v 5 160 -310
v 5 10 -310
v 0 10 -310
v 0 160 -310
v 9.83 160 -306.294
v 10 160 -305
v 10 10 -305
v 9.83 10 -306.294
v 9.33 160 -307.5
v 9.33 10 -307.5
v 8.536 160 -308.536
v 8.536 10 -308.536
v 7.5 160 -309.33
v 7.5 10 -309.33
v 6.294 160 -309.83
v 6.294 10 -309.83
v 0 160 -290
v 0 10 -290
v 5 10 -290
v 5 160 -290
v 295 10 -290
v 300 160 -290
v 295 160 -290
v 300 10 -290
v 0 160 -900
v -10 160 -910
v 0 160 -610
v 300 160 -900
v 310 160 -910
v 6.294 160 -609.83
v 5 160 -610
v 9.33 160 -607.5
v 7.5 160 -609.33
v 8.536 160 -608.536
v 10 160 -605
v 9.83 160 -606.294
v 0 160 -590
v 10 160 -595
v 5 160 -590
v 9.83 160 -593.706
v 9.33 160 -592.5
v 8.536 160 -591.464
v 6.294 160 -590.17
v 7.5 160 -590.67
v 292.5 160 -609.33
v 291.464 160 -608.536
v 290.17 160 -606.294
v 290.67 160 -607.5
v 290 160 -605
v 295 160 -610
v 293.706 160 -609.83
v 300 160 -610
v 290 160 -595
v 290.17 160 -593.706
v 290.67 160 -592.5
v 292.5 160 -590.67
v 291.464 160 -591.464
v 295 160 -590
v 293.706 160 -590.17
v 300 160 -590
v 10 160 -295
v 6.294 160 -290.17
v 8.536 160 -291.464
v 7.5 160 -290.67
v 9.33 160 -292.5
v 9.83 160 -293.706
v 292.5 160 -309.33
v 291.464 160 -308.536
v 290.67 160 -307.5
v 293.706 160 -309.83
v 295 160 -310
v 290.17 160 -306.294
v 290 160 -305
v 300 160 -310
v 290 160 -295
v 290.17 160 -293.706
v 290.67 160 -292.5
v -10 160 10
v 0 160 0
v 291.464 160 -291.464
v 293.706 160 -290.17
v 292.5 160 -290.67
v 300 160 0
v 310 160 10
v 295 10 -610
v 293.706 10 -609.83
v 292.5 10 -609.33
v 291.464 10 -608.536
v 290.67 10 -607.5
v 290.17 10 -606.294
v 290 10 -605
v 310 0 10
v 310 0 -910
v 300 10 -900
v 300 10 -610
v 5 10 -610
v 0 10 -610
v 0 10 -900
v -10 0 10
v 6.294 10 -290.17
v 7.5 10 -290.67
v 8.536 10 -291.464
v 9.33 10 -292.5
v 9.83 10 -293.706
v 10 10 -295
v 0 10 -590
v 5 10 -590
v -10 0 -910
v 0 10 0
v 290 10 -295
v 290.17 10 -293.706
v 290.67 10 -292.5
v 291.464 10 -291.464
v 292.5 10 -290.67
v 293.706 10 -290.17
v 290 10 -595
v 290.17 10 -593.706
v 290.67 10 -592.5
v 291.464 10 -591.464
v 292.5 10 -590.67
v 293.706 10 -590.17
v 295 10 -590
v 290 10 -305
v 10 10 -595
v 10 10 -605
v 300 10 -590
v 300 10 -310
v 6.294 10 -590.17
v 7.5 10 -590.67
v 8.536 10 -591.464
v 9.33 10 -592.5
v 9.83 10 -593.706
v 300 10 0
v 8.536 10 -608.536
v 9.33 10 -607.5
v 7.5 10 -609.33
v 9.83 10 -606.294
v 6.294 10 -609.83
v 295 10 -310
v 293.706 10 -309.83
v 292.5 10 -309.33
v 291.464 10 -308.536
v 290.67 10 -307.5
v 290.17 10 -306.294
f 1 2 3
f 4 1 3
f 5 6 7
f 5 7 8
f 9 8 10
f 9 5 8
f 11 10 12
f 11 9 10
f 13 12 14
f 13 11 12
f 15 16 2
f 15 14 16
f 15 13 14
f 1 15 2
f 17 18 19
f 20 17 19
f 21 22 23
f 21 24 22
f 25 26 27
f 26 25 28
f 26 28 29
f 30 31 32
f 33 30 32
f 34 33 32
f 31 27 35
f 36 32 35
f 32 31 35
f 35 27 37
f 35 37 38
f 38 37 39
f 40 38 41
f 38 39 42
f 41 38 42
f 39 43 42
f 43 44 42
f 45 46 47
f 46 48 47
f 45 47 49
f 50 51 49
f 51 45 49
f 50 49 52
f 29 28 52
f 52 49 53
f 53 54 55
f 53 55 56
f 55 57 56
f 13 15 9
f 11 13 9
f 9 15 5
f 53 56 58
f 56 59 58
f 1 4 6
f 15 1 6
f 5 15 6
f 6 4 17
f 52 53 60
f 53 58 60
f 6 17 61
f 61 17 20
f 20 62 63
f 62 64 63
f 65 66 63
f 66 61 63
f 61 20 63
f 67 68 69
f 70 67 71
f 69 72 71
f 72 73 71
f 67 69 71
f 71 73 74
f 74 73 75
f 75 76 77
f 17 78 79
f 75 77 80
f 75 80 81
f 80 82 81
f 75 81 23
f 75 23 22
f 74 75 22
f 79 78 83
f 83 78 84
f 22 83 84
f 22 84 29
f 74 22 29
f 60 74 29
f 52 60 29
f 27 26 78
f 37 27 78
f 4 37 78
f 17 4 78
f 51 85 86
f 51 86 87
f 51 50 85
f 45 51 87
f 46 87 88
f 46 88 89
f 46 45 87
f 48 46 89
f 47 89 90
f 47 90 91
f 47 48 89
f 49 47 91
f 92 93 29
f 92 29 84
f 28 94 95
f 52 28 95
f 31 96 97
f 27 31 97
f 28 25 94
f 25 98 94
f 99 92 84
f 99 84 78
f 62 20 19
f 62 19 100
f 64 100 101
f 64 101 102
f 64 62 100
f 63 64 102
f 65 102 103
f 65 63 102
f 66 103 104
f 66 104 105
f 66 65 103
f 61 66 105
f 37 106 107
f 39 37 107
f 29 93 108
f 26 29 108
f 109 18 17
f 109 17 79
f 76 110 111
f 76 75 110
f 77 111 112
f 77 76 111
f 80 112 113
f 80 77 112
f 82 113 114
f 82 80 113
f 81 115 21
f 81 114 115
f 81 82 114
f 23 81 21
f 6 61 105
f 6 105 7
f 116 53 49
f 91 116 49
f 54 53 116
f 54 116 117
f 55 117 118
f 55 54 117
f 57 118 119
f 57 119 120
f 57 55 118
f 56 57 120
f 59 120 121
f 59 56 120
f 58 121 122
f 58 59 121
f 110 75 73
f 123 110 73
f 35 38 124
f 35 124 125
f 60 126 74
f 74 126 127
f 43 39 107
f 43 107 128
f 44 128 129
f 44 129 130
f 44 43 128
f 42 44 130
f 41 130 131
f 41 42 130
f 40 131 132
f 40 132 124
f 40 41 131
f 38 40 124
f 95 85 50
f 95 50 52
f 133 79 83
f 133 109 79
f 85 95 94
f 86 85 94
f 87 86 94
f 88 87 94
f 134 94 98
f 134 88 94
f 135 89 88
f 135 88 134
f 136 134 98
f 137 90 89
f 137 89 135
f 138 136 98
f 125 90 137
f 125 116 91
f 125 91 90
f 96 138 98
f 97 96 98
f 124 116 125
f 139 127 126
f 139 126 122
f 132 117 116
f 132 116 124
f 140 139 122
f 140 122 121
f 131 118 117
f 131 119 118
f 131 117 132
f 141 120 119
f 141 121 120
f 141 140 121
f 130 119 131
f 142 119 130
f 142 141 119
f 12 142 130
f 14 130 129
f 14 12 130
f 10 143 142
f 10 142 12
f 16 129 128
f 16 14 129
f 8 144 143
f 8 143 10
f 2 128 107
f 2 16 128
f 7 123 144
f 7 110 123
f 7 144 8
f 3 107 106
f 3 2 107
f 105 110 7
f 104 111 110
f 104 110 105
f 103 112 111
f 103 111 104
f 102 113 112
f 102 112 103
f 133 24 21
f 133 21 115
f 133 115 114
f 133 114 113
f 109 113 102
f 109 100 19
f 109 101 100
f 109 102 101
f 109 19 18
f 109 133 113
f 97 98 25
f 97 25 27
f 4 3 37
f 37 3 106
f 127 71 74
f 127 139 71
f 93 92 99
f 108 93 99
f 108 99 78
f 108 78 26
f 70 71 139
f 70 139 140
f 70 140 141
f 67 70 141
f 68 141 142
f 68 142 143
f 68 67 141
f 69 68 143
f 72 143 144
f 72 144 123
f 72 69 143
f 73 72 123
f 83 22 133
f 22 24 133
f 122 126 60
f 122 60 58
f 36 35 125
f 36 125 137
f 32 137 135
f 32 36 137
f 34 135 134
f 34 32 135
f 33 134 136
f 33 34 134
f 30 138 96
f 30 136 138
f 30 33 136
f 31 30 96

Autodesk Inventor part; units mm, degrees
ref_plane "YZ Plane" through (0, 0, 0) normal (1, 0, 0) x (0, 1, 0)
ref_plane "XZ Plane" through (0, 0, 0) normal (0, 1, 0) x (-1, 0, 0)
ref_plane "XY Plane" through (0, 0, 0) normal (0, 0, 1) x (1, 0, 0)
sketch "Эскиз1" plane through (0, 0, 0) normal (0, 1, 0) x (-1, 0, 0)
  line L0 (0, 0) -> (-300, 0)
  line L1 (-300, 0) -> (-300, -900)
  line L2 (-300, -900) -> (0, -900)
  line L3 (0, -900) -> (0, 0)
  line L4 (-300, 0) -> (0, 0)
  line L5 (0, 0) -> (0, -300)
  line L6 (0, -300) -> (-300, -300)
  line L7 (-300, -300) -> (-300, 0)
  line L8 (0, -900) -> (-300, -900)
  line L9 (-300, -900) -> (-300, -600)
  line L10 (-300, -600) -> (0, -600)
  line L11 (0, -600) -> (0, -900)
  dimension "d0" = 300
  dimension "d1" = 900
extrude "Выдавливание1" add sketch "Эскиз1" along normal blind 10
sketch "Эскиз2" plane through (0, 0, 0) normal (0, -1, 0) x (1, 0, 0)
  line L0 (0, -900) -> (0, 0) projected
  line L1 (0, 0) -> (-10, 0)
  line L2 (-10, 0) -> (-10, -900)
  line L3 (-10, -900) -> (0, -900)
  line L4 (0, -900) -> (0, 0)
  line L5 (0, 0) -> (300, 0) projected
  line L6 (300, 0) -> (310, 0)
  line L7 (310, 0) -> (310, -900)
  line L8 (310, -900) -> (300, -900)
  line L9 (300, -900) -> (300, 0)
  line L10 (-10, -900) -> (310, -900)
  line L11 (310, -900) -> (310, -910)
  line L12 (310, -910) -> (-10, -910)
  line L13 (-10, -910) -> (-10, -900)
  line L14 (-10, 0) -> (310, 0)
  line L15 (310, 0) -> (310, 10)
  line L16 (310, 10) -> (-10, 10)
  line L17 (-10, 10) -> (-10, 0)
  dimension "d8" = 10
  dimension "d9" = 10
  dimension "d10" = 10
  dimension "d11" = 10
extrude "Выдавливание2" add sketch "Эскиз2" against normal blind 160 contours L3 L2 L1 L0 | L10 L8 L11 L12 L13 L3 | L1 L17 L16 L15 L6 L5 | L9 L6 L7 L8
ref_plane "РабПлоскость2" through (150, 0, 10) normal (1, 0, 0) x (0, 0, -1)
ref_plane "РабПлоскость3" through (-10, 0, -450) normal (0, 0, 1) x (1, 0, 0)
sketch "Эскиз3" plane through (0, 10, 0) normal (0, 1, 0) x (1, 0, 0)
  line L0 (300, 0) -> (0, 0) projected
  line L1 (300, 0) -> (300, 300)
  line L2 (300, 900) -> (300, 0) projected
  line L3 (300, 300) -> (300, 600)
  line L4 (310, -10) -> (310, 910) projected
  line L5 (290, 610) -> (310, 610)
  line L6 (310, 610) -> (310, 590)
  line L7 (310, 590) -> (290, 590)
  line L8 (290, 590) -> (290, 610)
  line L9 (290, 610) -> (310, 590) construction
  line L10 (310, 610) -> (290, 590) construction
  line L11 (290, 310) -> (310, 310)
  line L12 (310, 310) -> (310, 290)
  line L13 (310, 290) -> (290, 290)
  line L14 (290, 290) -> (290, 310)
  line L15 (290, 310) -> (310, 290) construction
  line L16 (310, 310) -> (290, 290) construction
  line L17 (10, 610) -> (-10, 610)
  line L18 (-10, 610) -> (-10, 590)
  line L19 (-10, 590) -> (10, 590)
  line L20 (10, 590) -> (10, 610)
  line L21 (0, 0) -> (0, 900) projected
  line L22 (10, 610) -> (-10, 590) construction
  line L23 (-10, 610) -> (10, 590) construction
  line L24 (-10, 910) -> (-10, -10) projected
  line L25 (10, 310) -> (-10, 310)
  line L26 (-10, 310) -> (-10, 290)
  line L27 (-10, 290) -> (10, 290)
  line L28 (10, 290) -> (10, 310)
  line L29 (10, 310) -> (-10, 290) construction
  line L30 (-10, 310) -> (10, 290) construction
  point P0 (0, 600)
  point P1 (0, 300)
  point P2 (0, 310)
  point P3 (0, 590)
  point P4 (300, 590)
  point P5 (300, 310)
  dimension "d14" = 300
  dimension "d15" = 300
  dimension "d16" = 20
  dimension "d17" = 20
extrude "Выдавливание3" add sketch "Эскиз3" along normal blind 150
fillet "Сопряжение1" radius 5 8 edges at (290, 85, -610) (290, 85, -590) (290, 85, -310) (290, 85, -290) (10, 85, -310) (10, 85, -290) (10, 85, -610) (10, 85, -590)
properties part number "lab"
